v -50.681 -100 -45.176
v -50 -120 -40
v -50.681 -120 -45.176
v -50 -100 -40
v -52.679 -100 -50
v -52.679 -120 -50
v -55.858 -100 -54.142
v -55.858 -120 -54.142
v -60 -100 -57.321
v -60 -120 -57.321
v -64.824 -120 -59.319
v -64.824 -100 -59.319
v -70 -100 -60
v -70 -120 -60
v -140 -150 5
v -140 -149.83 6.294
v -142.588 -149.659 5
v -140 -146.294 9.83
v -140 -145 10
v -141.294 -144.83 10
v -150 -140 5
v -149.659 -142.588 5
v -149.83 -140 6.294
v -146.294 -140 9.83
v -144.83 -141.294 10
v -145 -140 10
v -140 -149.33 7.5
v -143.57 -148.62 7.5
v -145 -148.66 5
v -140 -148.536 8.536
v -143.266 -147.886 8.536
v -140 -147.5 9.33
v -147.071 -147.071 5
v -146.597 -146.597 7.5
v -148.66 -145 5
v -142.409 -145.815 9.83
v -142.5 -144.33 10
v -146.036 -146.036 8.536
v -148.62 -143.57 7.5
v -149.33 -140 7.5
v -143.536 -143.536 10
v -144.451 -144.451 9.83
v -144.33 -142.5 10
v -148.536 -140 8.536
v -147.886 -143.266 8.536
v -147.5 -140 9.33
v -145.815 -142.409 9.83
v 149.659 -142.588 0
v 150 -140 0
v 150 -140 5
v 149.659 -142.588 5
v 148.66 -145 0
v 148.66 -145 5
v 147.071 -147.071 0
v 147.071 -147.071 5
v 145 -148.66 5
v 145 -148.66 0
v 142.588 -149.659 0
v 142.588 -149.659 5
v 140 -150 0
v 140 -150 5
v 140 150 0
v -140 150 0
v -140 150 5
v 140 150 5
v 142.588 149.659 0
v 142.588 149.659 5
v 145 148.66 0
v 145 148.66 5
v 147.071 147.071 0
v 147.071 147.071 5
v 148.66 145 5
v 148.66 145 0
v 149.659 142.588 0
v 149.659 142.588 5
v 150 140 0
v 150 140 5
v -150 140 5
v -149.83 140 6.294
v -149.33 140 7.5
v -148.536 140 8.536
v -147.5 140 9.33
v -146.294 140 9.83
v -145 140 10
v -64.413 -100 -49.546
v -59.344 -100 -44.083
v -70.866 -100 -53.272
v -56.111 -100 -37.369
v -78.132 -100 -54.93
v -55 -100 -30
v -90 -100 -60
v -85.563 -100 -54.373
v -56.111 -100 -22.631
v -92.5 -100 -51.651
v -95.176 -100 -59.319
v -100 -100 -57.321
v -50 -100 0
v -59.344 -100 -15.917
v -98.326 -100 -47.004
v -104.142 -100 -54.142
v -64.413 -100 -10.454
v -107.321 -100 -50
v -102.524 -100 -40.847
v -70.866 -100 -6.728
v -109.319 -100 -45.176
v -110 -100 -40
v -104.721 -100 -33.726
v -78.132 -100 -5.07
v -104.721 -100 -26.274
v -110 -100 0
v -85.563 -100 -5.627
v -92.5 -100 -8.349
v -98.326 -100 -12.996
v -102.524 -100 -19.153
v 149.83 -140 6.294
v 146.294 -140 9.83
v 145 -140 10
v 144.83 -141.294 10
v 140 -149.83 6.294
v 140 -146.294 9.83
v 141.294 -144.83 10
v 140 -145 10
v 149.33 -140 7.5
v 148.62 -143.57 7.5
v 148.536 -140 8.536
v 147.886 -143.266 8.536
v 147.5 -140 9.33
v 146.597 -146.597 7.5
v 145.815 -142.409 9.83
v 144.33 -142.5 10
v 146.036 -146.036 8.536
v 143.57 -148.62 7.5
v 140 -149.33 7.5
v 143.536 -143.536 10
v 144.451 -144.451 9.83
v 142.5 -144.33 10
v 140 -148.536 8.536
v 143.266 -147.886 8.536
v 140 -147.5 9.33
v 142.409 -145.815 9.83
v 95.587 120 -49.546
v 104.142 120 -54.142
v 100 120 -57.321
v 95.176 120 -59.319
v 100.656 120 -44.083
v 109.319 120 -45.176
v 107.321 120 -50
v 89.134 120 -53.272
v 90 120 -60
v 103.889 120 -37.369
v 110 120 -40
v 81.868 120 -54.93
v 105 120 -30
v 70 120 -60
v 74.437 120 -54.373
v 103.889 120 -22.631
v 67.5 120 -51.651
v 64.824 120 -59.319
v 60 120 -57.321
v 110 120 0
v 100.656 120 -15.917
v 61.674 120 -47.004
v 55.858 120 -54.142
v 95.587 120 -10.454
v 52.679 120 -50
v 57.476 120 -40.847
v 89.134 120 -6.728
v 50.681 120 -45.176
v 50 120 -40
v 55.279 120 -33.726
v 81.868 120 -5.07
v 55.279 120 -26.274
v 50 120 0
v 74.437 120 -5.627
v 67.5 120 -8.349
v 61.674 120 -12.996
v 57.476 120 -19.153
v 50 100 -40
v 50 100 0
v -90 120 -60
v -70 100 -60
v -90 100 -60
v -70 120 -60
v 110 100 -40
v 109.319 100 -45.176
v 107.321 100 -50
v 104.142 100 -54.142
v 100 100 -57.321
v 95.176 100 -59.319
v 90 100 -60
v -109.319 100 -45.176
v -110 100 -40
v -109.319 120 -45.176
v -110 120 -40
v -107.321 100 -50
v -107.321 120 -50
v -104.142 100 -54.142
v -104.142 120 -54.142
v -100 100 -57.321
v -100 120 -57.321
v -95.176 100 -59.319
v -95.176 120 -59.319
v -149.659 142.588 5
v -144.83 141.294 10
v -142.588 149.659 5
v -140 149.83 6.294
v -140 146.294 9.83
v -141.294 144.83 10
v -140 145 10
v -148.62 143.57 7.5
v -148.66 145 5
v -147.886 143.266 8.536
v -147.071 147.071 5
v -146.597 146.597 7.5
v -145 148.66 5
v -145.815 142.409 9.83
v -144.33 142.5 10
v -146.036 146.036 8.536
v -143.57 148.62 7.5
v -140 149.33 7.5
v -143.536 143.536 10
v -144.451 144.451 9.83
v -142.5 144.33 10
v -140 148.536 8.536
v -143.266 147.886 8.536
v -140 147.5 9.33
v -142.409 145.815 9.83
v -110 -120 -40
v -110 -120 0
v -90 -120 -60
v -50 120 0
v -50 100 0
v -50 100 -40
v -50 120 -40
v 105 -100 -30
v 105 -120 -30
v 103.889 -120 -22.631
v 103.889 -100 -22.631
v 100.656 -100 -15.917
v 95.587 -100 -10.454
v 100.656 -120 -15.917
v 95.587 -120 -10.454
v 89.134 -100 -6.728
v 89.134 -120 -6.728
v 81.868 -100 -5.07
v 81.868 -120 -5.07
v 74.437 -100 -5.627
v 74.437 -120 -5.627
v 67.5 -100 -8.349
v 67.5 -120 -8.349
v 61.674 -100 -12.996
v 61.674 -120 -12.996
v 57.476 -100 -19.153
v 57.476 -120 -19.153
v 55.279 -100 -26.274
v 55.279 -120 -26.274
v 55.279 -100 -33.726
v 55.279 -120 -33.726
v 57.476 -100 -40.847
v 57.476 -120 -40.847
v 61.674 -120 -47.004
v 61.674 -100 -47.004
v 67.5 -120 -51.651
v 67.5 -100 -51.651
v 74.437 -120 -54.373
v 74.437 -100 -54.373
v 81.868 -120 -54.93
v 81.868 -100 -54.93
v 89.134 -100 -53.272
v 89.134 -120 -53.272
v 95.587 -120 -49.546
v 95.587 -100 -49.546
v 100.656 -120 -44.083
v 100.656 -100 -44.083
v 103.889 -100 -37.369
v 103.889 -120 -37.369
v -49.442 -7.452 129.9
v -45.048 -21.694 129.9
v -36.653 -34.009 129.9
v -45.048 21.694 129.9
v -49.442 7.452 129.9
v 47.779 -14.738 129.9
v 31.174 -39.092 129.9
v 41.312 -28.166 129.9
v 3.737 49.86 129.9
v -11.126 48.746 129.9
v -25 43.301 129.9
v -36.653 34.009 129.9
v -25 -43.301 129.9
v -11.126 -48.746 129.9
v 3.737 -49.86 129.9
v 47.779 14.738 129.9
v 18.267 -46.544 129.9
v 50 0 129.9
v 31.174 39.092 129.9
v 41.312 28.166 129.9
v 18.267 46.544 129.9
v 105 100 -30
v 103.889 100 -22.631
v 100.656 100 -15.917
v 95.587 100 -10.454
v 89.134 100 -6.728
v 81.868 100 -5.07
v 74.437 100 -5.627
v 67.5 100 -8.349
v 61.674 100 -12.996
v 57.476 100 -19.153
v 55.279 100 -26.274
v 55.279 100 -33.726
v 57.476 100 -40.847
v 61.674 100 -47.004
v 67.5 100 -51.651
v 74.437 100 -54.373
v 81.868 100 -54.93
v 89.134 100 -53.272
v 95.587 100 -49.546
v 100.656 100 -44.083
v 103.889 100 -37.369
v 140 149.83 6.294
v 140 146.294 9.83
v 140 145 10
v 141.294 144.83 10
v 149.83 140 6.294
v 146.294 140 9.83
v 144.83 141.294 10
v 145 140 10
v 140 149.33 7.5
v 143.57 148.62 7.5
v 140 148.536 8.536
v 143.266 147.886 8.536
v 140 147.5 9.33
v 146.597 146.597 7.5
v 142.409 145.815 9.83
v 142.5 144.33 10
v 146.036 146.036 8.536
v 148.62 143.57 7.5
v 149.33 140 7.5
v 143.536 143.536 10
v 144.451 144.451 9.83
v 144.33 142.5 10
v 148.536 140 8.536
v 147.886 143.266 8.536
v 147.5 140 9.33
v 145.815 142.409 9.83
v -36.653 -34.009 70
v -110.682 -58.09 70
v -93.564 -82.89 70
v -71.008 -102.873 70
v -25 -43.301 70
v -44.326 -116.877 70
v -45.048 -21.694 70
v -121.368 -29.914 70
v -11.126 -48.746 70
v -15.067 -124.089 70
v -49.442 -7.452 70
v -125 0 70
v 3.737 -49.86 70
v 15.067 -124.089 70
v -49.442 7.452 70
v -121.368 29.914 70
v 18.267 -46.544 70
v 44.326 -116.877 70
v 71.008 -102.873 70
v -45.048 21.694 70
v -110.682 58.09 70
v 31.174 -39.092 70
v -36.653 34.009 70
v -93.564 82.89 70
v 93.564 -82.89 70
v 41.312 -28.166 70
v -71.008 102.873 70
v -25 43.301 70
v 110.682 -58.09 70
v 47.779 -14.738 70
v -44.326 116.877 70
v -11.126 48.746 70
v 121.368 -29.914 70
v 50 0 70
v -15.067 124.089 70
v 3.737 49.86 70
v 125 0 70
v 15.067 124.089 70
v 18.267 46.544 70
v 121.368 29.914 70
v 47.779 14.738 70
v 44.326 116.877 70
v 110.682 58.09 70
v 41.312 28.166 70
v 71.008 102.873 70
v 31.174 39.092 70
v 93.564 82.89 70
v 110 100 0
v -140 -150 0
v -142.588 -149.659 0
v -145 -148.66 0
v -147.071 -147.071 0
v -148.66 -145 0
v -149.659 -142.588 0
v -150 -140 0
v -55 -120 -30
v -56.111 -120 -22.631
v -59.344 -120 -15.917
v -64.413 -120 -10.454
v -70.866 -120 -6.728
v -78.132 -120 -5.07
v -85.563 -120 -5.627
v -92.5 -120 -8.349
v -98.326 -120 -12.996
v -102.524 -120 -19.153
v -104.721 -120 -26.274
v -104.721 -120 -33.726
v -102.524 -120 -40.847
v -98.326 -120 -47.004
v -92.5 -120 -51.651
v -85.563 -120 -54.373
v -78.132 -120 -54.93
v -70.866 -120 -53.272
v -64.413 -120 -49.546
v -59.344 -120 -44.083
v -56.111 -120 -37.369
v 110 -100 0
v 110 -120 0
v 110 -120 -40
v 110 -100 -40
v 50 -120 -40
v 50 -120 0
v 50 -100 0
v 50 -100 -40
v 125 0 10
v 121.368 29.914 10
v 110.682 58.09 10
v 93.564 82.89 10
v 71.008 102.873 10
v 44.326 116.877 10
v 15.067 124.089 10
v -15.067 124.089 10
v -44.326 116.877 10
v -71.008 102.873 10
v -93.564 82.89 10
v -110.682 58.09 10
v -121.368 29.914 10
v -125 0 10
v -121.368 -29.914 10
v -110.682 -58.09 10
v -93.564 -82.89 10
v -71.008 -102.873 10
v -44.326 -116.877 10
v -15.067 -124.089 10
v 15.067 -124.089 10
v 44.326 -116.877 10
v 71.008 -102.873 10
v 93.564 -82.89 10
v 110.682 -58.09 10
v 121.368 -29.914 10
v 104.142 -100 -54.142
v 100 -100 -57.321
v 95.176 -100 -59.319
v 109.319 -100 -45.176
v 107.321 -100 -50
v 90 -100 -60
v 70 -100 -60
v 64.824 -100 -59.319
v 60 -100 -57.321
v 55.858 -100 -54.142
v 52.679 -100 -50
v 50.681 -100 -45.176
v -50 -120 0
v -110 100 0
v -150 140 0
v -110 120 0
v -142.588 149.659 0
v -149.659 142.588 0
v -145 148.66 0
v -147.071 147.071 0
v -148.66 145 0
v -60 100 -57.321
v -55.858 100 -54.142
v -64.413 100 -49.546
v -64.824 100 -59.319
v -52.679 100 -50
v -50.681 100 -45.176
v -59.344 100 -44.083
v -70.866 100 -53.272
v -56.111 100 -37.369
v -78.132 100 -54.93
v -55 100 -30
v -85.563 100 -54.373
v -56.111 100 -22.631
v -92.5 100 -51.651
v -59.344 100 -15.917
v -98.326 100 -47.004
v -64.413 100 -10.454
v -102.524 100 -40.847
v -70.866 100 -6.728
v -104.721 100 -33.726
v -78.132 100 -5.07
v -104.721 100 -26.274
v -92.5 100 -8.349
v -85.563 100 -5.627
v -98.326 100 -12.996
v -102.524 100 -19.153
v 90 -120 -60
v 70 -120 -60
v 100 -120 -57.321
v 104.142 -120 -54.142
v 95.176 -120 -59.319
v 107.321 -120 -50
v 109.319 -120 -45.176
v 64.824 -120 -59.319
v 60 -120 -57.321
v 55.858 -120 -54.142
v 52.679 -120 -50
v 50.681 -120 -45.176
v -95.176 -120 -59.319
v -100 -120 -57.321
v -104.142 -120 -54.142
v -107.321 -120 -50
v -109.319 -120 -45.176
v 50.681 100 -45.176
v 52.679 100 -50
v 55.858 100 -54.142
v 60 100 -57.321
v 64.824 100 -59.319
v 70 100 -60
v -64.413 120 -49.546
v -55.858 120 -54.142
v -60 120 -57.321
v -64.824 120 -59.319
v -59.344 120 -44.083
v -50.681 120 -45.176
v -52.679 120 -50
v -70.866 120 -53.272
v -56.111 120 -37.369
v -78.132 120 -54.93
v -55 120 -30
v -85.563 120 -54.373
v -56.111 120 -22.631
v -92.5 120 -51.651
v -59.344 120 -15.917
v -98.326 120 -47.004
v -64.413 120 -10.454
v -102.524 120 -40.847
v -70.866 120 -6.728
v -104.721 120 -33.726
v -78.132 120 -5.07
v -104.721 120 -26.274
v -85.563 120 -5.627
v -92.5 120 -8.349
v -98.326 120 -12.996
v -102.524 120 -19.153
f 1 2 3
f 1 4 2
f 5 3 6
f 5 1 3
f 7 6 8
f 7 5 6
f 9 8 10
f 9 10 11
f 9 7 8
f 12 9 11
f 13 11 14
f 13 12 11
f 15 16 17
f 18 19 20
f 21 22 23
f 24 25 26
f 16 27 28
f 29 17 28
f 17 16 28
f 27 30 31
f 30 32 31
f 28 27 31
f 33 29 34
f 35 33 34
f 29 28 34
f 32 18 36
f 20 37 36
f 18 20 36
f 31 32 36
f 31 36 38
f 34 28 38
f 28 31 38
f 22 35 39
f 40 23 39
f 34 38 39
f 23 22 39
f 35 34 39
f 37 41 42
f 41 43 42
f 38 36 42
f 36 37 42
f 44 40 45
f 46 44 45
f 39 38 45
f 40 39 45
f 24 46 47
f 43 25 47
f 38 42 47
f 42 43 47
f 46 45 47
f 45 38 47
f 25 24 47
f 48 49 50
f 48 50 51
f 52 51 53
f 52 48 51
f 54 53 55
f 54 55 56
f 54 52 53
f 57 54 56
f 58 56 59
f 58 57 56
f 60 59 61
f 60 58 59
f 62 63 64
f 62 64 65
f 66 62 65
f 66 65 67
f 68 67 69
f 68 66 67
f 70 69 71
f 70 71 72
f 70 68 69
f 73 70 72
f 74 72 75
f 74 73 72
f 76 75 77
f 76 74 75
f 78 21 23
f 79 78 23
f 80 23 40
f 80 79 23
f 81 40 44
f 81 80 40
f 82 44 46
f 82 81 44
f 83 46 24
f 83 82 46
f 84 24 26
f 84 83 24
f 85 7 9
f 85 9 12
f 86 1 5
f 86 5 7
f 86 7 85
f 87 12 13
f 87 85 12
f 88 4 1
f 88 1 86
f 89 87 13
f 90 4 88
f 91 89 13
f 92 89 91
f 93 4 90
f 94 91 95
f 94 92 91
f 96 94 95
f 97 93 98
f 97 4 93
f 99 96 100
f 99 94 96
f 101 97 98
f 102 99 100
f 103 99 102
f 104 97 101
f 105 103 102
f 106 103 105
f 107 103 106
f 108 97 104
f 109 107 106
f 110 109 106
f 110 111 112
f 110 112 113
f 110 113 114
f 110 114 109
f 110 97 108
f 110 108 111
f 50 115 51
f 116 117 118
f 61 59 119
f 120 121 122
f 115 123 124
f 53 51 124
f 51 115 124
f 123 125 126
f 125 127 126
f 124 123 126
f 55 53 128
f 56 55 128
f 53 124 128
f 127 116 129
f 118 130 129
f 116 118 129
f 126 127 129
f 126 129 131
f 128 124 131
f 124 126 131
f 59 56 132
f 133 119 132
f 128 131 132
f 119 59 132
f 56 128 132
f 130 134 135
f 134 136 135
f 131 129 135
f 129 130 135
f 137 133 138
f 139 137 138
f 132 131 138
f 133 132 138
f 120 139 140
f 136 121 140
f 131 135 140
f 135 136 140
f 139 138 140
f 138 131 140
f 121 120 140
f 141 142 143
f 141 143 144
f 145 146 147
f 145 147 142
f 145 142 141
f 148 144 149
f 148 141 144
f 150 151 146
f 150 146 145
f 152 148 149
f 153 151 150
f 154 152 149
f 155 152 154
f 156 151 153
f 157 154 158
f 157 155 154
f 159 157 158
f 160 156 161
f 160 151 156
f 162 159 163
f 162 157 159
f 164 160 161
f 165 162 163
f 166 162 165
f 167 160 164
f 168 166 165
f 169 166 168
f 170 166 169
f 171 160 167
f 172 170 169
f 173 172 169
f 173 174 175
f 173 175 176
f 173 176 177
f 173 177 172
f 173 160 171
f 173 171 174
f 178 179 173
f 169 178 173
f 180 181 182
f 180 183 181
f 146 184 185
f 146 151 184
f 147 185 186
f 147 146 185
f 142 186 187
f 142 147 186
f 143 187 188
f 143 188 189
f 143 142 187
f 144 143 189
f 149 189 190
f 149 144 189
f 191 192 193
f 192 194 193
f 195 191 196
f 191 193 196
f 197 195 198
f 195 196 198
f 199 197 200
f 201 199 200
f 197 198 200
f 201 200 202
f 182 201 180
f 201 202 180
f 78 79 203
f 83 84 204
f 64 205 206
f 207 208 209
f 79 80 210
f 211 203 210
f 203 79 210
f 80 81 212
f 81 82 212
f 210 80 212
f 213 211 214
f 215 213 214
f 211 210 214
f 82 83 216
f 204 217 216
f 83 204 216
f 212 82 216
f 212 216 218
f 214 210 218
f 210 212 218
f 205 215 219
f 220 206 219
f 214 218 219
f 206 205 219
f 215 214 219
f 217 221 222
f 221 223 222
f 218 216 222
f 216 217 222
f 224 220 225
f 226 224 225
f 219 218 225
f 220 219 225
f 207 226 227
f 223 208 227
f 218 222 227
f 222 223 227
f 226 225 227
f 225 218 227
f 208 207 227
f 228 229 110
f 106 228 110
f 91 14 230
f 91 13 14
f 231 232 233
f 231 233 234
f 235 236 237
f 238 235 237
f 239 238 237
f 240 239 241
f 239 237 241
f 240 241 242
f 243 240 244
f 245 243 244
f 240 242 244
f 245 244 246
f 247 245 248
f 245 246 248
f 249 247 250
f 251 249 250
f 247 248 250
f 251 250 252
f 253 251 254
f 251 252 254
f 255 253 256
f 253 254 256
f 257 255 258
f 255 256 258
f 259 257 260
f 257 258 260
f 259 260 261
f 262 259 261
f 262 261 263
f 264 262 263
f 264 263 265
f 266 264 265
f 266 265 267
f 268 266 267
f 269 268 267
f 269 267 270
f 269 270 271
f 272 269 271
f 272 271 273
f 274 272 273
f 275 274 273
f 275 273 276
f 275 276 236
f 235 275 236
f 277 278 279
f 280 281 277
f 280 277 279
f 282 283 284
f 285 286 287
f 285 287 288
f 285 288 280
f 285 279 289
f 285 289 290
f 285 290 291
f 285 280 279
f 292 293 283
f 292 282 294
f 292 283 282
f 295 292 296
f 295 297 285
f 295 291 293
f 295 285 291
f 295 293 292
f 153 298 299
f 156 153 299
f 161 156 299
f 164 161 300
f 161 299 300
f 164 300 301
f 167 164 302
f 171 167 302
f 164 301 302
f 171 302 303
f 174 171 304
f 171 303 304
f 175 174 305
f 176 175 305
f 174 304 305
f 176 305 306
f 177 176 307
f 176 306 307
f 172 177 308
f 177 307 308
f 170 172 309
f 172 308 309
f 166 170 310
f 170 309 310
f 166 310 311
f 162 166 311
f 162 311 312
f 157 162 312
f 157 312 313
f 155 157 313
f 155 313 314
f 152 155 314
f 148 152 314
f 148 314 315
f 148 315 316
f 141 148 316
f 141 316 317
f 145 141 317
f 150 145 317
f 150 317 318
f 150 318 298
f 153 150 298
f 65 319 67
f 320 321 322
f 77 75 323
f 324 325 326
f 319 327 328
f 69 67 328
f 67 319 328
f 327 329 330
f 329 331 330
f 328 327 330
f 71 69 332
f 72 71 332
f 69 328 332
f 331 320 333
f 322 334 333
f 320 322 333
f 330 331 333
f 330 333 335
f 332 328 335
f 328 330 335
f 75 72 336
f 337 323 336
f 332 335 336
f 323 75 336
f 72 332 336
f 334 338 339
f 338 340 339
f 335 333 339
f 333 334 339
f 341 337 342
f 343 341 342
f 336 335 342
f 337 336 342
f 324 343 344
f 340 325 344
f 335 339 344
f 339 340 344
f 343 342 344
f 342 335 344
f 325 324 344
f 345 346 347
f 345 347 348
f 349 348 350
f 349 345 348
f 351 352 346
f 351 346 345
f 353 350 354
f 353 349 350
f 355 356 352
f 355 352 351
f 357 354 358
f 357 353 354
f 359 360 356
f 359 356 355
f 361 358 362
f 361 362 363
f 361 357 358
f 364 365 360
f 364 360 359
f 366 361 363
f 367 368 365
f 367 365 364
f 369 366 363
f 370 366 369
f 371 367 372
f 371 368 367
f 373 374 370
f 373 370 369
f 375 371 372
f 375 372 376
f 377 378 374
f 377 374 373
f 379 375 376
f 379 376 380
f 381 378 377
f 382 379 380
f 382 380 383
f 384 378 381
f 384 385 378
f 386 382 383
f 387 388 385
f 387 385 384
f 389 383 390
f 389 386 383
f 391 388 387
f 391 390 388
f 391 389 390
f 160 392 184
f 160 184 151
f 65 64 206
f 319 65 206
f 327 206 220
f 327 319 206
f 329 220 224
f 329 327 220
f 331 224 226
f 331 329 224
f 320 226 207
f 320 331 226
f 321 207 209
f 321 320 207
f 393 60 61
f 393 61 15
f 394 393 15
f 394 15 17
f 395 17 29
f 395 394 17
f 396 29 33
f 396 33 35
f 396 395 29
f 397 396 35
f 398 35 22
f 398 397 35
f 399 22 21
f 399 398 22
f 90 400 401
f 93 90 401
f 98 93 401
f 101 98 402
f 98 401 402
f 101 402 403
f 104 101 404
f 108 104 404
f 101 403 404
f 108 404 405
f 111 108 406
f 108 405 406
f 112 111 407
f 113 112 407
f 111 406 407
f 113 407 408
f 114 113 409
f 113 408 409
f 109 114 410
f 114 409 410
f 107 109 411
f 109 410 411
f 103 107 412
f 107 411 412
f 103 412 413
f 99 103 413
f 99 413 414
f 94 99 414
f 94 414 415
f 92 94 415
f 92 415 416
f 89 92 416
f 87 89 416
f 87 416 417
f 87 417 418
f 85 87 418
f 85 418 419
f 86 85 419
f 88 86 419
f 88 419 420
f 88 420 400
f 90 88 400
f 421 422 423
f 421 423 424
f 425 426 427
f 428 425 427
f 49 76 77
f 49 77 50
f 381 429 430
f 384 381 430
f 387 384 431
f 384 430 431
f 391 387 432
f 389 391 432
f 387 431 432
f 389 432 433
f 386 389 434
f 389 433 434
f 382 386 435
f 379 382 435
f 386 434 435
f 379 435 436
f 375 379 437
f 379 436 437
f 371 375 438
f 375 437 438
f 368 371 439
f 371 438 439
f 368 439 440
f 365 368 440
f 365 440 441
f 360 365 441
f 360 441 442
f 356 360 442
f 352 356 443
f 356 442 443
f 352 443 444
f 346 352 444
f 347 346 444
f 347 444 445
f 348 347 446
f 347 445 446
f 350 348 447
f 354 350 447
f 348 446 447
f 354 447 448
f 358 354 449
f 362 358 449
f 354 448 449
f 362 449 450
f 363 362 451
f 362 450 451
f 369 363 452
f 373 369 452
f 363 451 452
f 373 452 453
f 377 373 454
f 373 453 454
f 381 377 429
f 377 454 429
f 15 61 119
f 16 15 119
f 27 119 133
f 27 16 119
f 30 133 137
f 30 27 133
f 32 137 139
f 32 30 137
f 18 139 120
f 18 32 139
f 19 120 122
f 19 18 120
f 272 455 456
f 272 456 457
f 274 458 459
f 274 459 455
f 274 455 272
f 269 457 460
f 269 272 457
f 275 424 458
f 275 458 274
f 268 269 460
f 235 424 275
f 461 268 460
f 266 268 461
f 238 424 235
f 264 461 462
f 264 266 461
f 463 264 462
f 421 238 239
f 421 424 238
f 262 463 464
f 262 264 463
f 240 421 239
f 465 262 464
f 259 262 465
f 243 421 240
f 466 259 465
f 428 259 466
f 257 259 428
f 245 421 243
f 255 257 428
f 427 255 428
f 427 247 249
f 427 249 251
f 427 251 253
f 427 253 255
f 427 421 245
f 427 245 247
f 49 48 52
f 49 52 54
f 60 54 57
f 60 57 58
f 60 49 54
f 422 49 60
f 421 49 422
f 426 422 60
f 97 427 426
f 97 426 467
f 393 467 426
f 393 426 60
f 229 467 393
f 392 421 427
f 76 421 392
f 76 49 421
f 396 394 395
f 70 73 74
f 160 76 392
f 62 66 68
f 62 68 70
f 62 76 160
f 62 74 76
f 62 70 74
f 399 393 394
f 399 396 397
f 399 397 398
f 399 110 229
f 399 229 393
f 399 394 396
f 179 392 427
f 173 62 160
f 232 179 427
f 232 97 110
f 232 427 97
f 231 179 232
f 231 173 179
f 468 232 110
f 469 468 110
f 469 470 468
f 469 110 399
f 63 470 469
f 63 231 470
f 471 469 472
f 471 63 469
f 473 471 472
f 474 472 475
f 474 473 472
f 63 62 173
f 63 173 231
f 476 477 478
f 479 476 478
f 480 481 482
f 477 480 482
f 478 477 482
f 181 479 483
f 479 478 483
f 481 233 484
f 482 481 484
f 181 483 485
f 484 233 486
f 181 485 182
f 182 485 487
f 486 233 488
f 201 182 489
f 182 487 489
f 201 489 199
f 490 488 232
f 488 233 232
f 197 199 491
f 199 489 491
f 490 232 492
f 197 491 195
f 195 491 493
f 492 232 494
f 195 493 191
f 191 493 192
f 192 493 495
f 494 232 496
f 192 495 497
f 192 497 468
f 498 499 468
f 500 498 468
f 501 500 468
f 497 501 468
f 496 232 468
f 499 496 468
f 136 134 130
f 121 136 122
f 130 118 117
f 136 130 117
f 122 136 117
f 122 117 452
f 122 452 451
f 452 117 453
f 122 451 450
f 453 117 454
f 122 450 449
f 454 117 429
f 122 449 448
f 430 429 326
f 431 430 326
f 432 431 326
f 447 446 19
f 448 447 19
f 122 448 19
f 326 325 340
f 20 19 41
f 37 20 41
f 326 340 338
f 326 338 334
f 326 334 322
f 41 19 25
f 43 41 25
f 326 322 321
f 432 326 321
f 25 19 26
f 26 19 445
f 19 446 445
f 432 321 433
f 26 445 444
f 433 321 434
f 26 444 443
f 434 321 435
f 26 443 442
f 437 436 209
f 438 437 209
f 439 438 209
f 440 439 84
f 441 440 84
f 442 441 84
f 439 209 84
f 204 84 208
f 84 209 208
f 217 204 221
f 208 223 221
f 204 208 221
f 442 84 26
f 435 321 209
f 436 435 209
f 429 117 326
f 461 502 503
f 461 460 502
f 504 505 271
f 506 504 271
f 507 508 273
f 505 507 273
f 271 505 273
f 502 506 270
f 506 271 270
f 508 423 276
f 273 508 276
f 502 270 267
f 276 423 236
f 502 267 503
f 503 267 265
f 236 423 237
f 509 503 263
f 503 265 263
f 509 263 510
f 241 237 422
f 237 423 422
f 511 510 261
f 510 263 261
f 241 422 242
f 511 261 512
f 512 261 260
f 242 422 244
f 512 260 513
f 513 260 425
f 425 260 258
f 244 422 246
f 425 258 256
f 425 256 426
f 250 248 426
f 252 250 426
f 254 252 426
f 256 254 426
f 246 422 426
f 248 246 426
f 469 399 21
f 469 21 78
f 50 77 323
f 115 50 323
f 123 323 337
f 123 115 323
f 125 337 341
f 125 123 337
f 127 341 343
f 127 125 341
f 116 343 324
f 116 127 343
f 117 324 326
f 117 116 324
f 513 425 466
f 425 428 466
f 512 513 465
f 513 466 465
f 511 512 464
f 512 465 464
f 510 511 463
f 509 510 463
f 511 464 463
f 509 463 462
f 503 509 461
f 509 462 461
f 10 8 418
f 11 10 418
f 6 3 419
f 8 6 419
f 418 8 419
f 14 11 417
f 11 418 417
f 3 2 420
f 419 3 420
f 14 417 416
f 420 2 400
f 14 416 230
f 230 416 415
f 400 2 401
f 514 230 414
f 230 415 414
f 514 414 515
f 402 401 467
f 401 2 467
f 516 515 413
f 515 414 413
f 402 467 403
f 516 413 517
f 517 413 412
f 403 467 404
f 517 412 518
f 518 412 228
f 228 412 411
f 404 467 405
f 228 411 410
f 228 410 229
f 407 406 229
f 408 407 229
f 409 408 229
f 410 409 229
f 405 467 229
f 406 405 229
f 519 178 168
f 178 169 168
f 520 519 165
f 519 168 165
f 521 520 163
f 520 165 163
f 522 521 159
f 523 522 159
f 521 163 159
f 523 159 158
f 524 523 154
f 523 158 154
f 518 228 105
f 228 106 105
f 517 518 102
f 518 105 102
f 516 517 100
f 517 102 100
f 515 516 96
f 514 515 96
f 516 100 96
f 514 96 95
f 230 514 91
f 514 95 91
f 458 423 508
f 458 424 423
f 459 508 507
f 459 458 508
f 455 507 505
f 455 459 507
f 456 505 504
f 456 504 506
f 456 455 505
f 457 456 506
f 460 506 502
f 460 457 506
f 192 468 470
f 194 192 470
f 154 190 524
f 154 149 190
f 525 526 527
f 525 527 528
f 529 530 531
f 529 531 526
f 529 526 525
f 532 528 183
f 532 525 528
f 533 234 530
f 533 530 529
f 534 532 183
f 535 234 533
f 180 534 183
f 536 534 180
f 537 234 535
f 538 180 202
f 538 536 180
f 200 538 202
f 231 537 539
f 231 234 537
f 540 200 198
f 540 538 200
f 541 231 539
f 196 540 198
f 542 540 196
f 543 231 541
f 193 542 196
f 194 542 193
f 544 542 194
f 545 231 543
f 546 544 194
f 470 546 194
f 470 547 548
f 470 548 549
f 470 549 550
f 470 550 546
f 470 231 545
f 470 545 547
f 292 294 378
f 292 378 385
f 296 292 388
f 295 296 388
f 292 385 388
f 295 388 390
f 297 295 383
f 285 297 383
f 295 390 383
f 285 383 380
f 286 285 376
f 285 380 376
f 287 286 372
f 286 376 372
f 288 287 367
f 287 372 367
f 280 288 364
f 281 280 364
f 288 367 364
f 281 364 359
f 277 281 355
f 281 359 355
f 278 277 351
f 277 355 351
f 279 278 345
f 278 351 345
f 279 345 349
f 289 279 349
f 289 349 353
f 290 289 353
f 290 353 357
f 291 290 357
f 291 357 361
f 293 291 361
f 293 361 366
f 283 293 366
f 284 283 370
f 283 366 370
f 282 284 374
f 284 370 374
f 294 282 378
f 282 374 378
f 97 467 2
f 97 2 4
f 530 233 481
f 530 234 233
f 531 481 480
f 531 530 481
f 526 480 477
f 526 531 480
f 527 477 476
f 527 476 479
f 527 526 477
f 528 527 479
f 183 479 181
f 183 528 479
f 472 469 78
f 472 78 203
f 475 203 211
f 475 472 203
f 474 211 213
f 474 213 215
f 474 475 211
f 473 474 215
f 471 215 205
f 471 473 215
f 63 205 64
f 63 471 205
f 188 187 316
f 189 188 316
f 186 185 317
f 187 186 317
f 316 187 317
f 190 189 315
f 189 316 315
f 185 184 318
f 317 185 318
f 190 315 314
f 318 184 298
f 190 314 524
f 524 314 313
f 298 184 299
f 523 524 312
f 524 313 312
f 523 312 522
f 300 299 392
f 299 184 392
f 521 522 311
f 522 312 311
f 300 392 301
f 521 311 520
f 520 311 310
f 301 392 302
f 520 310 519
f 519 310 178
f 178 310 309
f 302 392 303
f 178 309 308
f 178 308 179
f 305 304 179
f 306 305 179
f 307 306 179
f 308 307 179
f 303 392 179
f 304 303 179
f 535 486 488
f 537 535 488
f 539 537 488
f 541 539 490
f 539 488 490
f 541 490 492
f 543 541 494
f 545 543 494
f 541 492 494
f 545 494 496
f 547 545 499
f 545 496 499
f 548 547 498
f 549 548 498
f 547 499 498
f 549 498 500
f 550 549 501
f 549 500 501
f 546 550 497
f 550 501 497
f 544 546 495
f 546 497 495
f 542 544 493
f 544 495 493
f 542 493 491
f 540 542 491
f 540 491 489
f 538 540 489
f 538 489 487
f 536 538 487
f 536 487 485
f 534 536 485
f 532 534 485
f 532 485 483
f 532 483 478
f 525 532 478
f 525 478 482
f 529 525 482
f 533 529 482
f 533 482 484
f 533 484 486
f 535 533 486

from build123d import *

# Parameters (mm, degrees)
BOSS_EXTRUDE1_DEPTH = 10
FILLET1_R           = 5
SKETCH3_W           = 60
SKETCH3_H           = 20
BOSS_EXTRUDE2_DEPTH = 60
FILLET2_R           = 20
SKETCH6_R           = 25
CUT_EXTRUDE1_DEPTH  = 271.0000001
SKETCH7_R           = 125
BOSS_EXTRUDE3_DEPTH = 60
SKETCH8_R           = 50
BOSS_EXTRUDE5_DEPTH = 59.9


with BuildPart() as part:
    # Sketch2 → Boss-Extrude1 (new body)
    with BuildSketch(Plane.XY):
        with BuildLine():
            Line((-140, 150), (140, 150))
            ThreePointArc((140, 150), (147.071067812, 147.071067812), (150, 140))
            Line((150, 140), (150, -140))
            ThreePointArc((150, -140), (147.071067812, -147.071067812), (140, -150))
            Line((140, -150), (-140, -150))
            ThreePointArc((-140, -150), (-147.071067812, -147.071067812), (-150, -140))
            Line((-150, -140), (-150, 140))
            ThreePointArc((-150, 140), (-147.071067812, 147.071067812), (-140, 150))
        make_face()
    extrude(amount=BOSS_EXTRUDE1_DEPTH)

    # Fillet1
    fillet1_edges = [part.edges().sort_by_distance(p)[0] for p in [
        (147.071067812, -147.071067812, 10),
        (150, 0, 10),
        (147.071067812, 147.071067812, 10),
        (0, 150, 10),
        (-147.071067812, 147.071067812, 10),
        (-150, 0, 10),
        (-147.071067812, -147.071067812, 10),
        (0, -150, 10),
    ]]
    fillet(fillet1_edges, radius=FILLET1_R)

    # Sketch3 → Boss-Extrude2 (add)
    with BuildSketch(Plane(origin=(0, 0, 0), x_dir=(-1, 0, 0), z_dir=(0, 0, -1))):
        with Locations((80, 110)):
            Rectangle(SKETCH3_W, SKETCH3_H)
        with Locations((-80, 110)):
            Rectangle(SKETCH3_W, SKETCH3_H)
        with Locations((80, -110)):
            Rectangle(SKETCH3_W, SKETCH3_H)
        with Locations((-80, -110)):
            Rectangle(SKETCH3_W, SKETCH3_H)
    extrude(amount=BOSS_EXTRUDE2_DEPTH)

    # Fillet2
    fillet2_edges = [part.edges().sort_by_distance(p)[0] for p in [
        (-110, 110, -60),
        (-50, 110, -60),
        (50, 110, -60),
        (110, 110, -60),
        (-50, -110, -60),
        (-110, -110, -60),
        (110, -110, -60),
        (50, -110, -60),
    ]]
    fillet(fillet2_edges, radius=FILLET2_R)

    # Sketch6 → Cut-Extrude1 (cut, through all)
    with BuildSketch(Plane.XZ.offset(120)):
        with Locations((-80, -30)):
            Circle(SKETCH6_R)
        with Locations((80, -30)):
            Circle(SKETCH6_R)
    extrude(amount=-CUT_EXTRUDE1_DEPTH, mode=Mode.SUBTRACT)

    # Sketch7 → Boss-Extrude3 (add)
    with BuildSketch(Plane.XY.offset(10)):
        Circle(SKETCH7_R)
    extrude(amount=BOSS_EXTRUDE3_DEPTH)

    # Sketch8 → Boss-Extrude5 (add)
    with BuildSketch(Plane.XY.offset(70)):
        Circle(SKETCH8_R)
    extrude(amount=BOSS_EXTRUDE5_DEPTH)


solid = part.part
